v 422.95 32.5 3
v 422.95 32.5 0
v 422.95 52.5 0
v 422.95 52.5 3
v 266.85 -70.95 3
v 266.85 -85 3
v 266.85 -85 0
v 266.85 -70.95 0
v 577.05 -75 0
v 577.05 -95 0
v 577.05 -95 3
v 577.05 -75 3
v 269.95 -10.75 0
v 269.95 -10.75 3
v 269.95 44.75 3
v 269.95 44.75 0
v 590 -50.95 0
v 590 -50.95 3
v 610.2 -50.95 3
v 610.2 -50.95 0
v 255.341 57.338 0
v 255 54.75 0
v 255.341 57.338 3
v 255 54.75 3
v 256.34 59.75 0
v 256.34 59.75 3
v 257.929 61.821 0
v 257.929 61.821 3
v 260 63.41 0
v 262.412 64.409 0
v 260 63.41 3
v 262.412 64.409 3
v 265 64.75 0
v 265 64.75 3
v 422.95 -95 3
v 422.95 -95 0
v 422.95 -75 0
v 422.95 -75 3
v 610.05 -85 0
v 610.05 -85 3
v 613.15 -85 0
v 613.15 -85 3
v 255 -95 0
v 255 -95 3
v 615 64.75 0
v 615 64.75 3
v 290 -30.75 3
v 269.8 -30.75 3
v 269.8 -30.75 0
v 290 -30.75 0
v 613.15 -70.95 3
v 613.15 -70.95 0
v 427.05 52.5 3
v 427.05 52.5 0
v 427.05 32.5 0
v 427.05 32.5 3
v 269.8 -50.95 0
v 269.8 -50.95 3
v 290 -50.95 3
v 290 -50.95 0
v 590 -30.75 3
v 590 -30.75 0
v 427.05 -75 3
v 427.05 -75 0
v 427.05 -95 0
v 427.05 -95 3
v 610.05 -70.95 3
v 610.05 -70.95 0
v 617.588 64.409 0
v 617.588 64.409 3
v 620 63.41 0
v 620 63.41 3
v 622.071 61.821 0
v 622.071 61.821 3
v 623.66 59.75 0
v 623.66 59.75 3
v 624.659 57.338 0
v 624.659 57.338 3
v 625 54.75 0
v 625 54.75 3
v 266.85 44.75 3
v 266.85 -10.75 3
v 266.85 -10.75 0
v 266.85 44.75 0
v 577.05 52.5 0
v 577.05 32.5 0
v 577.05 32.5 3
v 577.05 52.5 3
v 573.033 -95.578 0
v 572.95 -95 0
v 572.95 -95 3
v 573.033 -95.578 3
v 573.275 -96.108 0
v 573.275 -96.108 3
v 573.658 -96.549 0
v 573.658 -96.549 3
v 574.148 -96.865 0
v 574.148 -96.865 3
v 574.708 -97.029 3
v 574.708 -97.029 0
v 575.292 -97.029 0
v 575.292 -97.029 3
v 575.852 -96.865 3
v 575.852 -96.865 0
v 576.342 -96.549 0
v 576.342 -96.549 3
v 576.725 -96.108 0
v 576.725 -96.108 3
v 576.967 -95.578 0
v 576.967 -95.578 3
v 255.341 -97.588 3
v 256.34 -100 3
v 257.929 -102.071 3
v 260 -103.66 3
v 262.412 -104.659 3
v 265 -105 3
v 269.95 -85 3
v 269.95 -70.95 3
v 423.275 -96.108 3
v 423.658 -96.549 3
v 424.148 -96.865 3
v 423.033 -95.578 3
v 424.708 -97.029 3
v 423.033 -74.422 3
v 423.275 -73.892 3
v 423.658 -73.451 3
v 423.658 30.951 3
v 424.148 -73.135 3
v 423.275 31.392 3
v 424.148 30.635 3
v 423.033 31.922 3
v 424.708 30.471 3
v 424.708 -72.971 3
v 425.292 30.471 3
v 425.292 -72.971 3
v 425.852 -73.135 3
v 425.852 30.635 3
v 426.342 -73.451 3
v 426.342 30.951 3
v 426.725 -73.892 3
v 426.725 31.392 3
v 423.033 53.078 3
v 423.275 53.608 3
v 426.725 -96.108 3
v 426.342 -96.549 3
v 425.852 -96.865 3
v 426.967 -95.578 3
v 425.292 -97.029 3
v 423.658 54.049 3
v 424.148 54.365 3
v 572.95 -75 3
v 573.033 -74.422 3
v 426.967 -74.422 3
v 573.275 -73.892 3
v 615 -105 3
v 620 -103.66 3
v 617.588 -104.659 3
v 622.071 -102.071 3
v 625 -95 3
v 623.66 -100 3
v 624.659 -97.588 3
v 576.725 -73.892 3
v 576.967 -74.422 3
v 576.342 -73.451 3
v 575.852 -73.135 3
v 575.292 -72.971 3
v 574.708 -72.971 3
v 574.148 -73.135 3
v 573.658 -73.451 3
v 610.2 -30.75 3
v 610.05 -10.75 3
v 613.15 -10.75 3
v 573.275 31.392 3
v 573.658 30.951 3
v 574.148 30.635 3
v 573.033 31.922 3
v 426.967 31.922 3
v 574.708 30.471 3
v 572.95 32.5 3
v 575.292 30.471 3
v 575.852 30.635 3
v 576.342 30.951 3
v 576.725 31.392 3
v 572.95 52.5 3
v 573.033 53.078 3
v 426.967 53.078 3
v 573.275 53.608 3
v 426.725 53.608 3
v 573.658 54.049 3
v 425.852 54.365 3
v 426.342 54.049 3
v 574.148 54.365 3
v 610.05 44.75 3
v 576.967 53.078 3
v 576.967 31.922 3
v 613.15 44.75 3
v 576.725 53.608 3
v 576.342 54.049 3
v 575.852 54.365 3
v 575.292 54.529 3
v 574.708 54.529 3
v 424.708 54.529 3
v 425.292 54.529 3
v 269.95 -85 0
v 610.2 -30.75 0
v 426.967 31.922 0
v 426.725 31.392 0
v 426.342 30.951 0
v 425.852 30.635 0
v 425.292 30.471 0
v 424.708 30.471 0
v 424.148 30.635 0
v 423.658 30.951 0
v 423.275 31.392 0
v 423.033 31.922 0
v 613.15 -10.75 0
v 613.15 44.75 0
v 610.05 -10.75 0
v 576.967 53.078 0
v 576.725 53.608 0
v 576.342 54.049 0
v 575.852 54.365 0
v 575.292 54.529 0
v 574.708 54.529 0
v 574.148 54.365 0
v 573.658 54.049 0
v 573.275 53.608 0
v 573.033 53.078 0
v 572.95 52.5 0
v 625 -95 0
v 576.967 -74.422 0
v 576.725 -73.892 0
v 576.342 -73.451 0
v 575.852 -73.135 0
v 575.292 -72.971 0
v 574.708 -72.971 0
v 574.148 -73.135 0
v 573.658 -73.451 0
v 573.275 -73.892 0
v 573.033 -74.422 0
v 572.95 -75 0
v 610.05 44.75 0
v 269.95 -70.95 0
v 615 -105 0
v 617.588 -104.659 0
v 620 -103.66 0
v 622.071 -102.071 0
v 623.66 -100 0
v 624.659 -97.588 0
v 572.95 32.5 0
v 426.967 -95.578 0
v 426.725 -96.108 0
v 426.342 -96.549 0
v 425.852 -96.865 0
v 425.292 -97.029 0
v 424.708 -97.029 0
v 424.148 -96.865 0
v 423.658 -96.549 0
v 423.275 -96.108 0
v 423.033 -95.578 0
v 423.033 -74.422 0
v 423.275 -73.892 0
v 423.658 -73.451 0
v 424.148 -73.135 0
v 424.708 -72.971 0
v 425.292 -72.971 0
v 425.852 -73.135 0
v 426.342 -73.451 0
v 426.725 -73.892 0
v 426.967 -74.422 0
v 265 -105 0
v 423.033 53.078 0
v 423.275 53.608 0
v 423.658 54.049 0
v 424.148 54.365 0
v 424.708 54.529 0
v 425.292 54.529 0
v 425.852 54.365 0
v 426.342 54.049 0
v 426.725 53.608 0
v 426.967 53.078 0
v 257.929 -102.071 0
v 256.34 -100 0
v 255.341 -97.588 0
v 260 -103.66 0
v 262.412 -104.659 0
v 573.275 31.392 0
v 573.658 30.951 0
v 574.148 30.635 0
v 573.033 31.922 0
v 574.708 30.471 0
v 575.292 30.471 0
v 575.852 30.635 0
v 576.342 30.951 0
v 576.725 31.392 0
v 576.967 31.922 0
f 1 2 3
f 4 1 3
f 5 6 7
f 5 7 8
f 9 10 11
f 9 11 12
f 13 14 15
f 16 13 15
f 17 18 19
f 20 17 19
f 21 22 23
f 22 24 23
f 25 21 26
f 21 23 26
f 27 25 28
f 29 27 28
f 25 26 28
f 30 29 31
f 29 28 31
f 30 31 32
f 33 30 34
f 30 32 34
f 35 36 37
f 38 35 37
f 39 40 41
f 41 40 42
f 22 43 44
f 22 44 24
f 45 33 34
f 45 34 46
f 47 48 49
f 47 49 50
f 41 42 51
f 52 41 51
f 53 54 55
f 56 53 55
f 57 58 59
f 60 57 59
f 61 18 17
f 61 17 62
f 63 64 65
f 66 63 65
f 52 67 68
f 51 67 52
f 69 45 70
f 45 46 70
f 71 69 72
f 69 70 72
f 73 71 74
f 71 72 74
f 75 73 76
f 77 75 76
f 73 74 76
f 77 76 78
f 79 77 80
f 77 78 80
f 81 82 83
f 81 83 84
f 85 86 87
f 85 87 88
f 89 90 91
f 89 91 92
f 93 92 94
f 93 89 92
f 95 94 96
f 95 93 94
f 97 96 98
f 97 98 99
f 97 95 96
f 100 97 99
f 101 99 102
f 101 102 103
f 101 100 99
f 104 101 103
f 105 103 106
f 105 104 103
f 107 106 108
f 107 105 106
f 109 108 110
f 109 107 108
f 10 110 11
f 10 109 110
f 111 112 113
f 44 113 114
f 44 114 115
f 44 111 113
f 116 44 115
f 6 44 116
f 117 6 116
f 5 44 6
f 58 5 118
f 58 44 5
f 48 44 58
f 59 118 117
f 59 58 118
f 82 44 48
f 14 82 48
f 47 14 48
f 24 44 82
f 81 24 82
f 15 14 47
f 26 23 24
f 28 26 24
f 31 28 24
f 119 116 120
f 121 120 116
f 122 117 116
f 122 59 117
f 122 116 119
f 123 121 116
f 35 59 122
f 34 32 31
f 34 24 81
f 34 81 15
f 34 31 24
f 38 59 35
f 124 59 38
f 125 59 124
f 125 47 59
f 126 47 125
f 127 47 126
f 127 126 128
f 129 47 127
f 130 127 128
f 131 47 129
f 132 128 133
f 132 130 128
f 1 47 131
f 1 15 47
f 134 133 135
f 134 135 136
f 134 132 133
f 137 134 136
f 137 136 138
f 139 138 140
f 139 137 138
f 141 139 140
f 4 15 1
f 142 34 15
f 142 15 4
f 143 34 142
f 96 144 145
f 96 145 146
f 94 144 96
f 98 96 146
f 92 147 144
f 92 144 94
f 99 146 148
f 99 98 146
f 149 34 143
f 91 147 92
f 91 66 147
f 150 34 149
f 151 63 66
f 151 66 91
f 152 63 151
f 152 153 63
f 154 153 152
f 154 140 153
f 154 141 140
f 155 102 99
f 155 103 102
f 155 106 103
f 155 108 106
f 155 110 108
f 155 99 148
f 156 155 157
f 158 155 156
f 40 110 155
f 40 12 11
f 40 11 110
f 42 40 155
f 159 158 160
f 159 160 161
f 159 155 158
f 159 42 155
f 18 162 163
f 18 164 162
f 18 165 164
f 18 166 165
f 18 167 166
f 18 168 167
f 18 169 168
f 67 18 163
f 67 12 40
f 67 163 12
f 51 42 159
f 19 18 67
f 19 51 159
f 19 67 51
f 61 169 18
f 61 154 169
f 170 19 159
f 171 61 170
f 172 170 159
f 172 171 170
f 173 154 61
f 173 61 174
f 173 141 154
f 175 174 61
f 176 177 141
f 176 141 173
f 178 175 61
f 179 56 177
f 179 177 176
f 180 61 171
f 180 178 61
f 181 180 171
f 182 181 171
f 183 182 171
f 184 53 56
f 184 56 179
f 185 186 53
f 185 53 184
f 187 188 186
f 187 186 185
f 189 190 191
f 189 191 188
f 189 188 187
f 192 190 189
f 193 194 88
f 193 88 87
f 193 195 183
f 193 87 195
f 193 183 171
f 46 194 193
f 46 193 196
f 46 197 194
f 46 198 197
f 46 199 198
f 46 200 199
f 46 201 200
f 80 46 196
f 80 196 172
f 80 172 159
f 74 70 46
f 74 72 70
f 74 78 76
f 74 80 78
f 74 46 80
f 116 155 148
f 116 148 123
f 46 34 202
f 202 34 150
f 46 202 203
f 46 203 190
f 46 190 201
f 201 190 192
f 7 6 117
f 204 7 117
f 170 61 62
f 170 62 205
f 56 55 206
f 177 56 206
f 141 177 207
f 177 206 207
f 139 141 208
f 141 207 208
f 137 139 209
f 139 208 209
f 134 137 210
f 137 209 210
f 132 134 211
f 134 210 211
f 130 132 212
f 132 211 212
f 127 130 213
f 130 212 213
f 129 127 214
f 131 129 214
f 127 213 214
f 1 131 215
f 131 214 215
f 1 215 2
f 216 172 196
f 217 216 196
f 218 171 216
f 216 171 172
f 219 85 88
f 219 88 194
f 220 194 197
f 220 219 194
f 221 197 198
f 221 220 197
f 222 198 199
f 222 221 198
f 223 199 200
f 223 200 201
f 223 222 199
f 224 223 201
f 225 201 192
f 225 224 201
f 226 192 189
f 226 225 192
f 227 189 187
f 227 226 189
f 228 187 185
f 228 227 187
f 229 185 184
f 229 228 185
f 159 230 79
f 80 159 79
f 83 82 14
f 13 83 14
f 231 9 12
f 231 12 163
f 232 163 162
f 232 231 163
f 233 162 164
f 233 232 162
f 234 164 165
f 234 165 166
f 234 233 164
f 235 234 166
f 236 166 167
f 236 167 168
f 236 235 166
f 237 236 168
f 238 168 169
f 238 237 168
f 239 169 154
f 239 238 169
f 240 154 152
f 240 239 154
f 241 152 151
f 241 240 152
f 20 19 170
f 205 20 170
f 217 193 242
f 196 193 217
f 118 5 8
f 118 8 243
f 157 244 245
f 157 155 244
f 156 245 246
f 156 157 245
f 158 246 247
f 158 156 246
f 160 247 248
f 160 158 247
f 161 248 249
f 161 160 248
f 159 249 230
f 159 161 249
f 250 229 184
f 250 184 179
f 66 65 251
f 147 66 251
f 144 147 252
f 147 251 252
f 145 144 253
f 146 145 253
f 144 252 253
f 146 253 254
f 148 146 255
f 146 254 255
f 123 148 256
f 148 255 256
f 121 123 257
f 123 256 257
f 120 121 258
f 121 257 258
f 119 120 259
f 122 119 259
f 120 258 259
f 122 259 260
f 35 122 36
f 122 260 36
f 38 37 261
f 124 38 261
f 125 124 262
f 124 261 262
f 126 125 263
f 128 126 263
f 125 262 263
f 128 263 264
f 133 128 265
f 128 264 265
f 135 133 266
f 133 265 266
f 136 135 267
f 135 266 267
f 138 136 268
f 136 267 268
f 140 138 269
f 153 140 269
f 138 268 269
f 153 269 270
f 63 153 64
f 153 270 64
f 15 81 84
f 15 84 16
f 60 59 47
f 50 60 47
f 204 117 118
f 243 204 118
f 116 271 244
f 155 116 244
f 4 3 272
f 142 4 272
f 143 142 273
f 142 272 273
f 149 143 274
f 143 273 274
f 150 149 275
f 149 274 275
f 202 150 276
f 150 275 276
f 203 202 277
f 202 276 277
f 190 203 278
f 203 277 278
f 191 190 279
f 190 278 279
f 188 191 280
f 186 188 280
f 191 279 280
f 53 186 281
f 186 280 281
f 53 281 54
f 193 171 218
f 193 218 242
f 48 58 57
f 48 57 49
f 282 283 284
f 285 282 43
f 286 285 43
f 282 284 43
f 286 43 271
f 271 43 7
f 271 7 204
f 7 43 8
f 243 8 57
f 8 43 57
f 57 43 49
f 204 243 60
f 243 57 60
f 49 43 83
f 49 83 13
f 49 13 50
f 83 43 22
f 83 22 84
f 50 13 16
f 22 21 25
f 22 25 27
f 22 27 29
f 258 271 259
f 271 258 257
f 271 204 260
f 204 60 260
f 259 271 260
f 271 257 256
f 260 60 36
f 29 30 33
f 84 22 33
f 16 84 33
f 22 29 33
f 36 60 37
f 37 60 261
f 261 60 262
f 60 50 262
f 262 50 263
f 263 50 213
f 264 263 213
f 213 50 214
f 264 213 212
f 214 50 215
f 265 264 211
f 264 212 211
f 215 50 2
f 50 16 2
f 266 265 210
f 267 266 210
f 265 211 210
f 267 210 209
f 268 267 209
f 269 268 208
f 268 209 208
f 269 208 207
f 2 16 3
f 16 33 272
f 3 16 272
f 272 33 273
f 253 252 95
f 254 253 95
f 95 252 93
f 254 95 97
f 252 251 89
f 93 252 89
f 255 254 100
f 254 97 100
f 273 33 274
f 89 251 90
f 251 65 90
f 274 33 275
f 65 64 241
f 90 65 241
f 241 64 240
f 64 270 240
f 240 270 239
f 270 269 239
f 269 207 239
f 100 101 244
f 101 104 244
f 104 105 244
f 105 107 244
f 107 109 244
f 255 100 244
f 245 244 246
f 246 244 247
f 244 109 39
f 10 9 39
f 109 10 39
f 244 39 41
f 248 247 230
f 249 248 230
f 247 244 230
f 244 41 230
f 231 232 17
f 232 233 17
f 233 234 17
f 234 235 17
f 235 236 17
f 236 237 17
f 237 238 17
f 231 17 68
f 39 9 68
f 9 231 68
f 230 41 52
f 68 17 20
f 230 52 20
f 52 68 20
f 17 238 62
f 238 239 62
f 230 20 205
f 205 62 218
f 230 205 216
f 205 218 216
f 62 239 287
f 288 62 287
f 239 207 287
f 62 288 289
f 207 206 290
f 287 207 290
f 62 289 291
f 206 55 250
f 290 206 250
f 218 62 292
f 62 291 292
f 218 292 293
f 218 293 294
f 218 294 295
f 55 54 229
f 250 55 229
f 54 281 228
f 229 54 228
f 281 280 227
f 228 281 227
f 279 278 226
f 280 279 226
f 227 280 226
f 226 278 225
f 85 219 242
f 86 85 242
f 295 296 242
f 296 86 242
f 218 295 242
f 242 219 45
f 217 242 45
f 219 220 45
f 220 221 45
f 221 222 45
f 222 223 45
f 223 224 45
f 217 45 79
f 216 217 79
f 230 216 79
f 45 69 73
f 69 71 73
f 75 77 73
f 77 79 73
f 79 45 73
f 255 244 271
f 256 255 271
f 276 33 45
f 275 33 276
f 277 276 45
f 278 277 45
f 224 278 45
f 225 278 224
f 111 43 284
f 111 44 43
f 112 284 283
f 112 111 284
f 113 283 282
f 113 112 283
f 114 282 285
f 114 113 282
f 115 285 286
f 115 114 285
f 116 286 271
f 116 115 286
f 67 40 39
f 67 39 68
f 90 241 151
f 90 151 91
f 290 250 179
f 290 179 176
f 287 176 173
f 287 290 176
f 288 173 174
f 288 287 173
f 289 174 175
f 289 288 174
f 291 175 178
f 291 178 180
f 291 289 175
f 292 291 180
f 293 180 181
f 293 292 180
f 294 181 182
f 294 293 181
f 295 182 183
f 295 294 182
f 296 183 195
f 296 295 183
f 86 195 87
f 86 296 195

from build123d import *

# Parameters (mm, degrees)
SKETCH1_W           = 370
SKETCH1_H           = 169.75
BOSS_EXTRUDE1_DEPTH = 3
SKETCH3_W           = 20.2
SKETCH3_H           = 20.2
CUT_EXTRUDE1_DEPTH  = 4
SKETCH4_W           = 3.1
SKETCH4_H           = 55.5
SKETCH4_H_2         = 14.05
CUT_EXTRUDE2_DEPTH  = 4
FILLET1_R           = 10


with BuildPart() as part:
    # Sketch1 → Boss-Extrude1 (new body)
    with BuildSketch(Plane.XY):
        with Locations((440, -20.125)):
            Rectangle(SKETCH1_W, SKETCH1_H)
        with BuildLine():
            Line((427.05, 52.5), (427.05, 32.5))
            ThreePointArc((427.05, 32.5), (425, 30.45), (422.95, 32.5))
            Line((422.95, 32.5), (422.95, 52.5))
            ThreePointArc((422.95, 52.5), (425, 54.55), (427.05, 52.5))
        make_face(mode=Mode.SUBTRACT)
        with BuildLine():
            Line((572.95, 52.5), (572.95, 32.5))
            ThreePointArc((572.95, 32.5), (575, 30.45), (577.05, 32.5))
            Line((577.05, 32.5), (577.05, 52.5))
            ThreePointArc((577.05, 52.5), (575, 54.55), (572.95, 52.5))
        make_face(mode=Mode.SUBTRACT)
        with BuildLine():
            Line((427.05, -75), (427.05, -95))
            ThreePointArc((427.05, -95), (425, -97.05), (422.95, -95))
            Line((422.95, -95), (422.95, -75))
            ThreePointArc((422.95, -75), (425, -72.95), (427.05, -75))
        make_face(mode=Mode.SUBTRACT)
        with BuildLine():
            Line((572.95, -75), (572.95, -95))
            ThreePointArc((572.95, -95), (575, -97.05), (577.05, -95))
            Line((577.05, -95), (577.05, -75))
            ThreePointArc((577.05, -75), (575, -72.95), (572.95, -75))
        make_face(mode=Mode.SUBTRACT)
    extrude(amount=BOSS_EXTRUDE1_DEPTH)

    # Sketch3 → Cut-Extrude1 (cut, through all)
    with BuildSketch(Plane.XY.offset(3)):
        with Locations((279.9, -40.85)):
            Rectangle(SKETCH3_W, SKETCH3_H)
        with Locations((600.1, -40.85)):
            Rectangle(SKETCH3_W, SKETCH3_H)
    extrude(amount=-CUT_EXTRUDE1_DEPTH, mode=Mode.SUBTRACT)

    # Sketch4 → Cut-Extrude2 (cut, through all)
    with BuildSketch(Plane.XY.offset(3)):
        with Locations((268.4, 17)):
            Rectangle(SKETCH4_W, SKETCH4_H)
        with Locations((268.4, -77.975)):
            Rectangle(SKETCH4_W, SKETCH4_H_2)
        with Locations((611.6, -77.975)):
            Rectangle(SKETCH4_W, SKETCH4_H_2)
        with Locations((611.6, 17)):
            Rectangle(SKETCH4_W, SKETCH4_H)
    extrude(amount=-CUT_EXTRUDE2_DEPTH, mode=Mode.SUBTRACT)

    # Fillet1
    fillet1_edges = [part.edges().sort_by_distance(p)[0] for p in [
        (625, -105, 1.5),
        (255, -105, 1.5),
        (255, 64.75, 1.5),
        (625, 64.75, 1.5),
    ]]
    fillet(fillet1_edges, radius=FILLET1_R)


solid = part.part
